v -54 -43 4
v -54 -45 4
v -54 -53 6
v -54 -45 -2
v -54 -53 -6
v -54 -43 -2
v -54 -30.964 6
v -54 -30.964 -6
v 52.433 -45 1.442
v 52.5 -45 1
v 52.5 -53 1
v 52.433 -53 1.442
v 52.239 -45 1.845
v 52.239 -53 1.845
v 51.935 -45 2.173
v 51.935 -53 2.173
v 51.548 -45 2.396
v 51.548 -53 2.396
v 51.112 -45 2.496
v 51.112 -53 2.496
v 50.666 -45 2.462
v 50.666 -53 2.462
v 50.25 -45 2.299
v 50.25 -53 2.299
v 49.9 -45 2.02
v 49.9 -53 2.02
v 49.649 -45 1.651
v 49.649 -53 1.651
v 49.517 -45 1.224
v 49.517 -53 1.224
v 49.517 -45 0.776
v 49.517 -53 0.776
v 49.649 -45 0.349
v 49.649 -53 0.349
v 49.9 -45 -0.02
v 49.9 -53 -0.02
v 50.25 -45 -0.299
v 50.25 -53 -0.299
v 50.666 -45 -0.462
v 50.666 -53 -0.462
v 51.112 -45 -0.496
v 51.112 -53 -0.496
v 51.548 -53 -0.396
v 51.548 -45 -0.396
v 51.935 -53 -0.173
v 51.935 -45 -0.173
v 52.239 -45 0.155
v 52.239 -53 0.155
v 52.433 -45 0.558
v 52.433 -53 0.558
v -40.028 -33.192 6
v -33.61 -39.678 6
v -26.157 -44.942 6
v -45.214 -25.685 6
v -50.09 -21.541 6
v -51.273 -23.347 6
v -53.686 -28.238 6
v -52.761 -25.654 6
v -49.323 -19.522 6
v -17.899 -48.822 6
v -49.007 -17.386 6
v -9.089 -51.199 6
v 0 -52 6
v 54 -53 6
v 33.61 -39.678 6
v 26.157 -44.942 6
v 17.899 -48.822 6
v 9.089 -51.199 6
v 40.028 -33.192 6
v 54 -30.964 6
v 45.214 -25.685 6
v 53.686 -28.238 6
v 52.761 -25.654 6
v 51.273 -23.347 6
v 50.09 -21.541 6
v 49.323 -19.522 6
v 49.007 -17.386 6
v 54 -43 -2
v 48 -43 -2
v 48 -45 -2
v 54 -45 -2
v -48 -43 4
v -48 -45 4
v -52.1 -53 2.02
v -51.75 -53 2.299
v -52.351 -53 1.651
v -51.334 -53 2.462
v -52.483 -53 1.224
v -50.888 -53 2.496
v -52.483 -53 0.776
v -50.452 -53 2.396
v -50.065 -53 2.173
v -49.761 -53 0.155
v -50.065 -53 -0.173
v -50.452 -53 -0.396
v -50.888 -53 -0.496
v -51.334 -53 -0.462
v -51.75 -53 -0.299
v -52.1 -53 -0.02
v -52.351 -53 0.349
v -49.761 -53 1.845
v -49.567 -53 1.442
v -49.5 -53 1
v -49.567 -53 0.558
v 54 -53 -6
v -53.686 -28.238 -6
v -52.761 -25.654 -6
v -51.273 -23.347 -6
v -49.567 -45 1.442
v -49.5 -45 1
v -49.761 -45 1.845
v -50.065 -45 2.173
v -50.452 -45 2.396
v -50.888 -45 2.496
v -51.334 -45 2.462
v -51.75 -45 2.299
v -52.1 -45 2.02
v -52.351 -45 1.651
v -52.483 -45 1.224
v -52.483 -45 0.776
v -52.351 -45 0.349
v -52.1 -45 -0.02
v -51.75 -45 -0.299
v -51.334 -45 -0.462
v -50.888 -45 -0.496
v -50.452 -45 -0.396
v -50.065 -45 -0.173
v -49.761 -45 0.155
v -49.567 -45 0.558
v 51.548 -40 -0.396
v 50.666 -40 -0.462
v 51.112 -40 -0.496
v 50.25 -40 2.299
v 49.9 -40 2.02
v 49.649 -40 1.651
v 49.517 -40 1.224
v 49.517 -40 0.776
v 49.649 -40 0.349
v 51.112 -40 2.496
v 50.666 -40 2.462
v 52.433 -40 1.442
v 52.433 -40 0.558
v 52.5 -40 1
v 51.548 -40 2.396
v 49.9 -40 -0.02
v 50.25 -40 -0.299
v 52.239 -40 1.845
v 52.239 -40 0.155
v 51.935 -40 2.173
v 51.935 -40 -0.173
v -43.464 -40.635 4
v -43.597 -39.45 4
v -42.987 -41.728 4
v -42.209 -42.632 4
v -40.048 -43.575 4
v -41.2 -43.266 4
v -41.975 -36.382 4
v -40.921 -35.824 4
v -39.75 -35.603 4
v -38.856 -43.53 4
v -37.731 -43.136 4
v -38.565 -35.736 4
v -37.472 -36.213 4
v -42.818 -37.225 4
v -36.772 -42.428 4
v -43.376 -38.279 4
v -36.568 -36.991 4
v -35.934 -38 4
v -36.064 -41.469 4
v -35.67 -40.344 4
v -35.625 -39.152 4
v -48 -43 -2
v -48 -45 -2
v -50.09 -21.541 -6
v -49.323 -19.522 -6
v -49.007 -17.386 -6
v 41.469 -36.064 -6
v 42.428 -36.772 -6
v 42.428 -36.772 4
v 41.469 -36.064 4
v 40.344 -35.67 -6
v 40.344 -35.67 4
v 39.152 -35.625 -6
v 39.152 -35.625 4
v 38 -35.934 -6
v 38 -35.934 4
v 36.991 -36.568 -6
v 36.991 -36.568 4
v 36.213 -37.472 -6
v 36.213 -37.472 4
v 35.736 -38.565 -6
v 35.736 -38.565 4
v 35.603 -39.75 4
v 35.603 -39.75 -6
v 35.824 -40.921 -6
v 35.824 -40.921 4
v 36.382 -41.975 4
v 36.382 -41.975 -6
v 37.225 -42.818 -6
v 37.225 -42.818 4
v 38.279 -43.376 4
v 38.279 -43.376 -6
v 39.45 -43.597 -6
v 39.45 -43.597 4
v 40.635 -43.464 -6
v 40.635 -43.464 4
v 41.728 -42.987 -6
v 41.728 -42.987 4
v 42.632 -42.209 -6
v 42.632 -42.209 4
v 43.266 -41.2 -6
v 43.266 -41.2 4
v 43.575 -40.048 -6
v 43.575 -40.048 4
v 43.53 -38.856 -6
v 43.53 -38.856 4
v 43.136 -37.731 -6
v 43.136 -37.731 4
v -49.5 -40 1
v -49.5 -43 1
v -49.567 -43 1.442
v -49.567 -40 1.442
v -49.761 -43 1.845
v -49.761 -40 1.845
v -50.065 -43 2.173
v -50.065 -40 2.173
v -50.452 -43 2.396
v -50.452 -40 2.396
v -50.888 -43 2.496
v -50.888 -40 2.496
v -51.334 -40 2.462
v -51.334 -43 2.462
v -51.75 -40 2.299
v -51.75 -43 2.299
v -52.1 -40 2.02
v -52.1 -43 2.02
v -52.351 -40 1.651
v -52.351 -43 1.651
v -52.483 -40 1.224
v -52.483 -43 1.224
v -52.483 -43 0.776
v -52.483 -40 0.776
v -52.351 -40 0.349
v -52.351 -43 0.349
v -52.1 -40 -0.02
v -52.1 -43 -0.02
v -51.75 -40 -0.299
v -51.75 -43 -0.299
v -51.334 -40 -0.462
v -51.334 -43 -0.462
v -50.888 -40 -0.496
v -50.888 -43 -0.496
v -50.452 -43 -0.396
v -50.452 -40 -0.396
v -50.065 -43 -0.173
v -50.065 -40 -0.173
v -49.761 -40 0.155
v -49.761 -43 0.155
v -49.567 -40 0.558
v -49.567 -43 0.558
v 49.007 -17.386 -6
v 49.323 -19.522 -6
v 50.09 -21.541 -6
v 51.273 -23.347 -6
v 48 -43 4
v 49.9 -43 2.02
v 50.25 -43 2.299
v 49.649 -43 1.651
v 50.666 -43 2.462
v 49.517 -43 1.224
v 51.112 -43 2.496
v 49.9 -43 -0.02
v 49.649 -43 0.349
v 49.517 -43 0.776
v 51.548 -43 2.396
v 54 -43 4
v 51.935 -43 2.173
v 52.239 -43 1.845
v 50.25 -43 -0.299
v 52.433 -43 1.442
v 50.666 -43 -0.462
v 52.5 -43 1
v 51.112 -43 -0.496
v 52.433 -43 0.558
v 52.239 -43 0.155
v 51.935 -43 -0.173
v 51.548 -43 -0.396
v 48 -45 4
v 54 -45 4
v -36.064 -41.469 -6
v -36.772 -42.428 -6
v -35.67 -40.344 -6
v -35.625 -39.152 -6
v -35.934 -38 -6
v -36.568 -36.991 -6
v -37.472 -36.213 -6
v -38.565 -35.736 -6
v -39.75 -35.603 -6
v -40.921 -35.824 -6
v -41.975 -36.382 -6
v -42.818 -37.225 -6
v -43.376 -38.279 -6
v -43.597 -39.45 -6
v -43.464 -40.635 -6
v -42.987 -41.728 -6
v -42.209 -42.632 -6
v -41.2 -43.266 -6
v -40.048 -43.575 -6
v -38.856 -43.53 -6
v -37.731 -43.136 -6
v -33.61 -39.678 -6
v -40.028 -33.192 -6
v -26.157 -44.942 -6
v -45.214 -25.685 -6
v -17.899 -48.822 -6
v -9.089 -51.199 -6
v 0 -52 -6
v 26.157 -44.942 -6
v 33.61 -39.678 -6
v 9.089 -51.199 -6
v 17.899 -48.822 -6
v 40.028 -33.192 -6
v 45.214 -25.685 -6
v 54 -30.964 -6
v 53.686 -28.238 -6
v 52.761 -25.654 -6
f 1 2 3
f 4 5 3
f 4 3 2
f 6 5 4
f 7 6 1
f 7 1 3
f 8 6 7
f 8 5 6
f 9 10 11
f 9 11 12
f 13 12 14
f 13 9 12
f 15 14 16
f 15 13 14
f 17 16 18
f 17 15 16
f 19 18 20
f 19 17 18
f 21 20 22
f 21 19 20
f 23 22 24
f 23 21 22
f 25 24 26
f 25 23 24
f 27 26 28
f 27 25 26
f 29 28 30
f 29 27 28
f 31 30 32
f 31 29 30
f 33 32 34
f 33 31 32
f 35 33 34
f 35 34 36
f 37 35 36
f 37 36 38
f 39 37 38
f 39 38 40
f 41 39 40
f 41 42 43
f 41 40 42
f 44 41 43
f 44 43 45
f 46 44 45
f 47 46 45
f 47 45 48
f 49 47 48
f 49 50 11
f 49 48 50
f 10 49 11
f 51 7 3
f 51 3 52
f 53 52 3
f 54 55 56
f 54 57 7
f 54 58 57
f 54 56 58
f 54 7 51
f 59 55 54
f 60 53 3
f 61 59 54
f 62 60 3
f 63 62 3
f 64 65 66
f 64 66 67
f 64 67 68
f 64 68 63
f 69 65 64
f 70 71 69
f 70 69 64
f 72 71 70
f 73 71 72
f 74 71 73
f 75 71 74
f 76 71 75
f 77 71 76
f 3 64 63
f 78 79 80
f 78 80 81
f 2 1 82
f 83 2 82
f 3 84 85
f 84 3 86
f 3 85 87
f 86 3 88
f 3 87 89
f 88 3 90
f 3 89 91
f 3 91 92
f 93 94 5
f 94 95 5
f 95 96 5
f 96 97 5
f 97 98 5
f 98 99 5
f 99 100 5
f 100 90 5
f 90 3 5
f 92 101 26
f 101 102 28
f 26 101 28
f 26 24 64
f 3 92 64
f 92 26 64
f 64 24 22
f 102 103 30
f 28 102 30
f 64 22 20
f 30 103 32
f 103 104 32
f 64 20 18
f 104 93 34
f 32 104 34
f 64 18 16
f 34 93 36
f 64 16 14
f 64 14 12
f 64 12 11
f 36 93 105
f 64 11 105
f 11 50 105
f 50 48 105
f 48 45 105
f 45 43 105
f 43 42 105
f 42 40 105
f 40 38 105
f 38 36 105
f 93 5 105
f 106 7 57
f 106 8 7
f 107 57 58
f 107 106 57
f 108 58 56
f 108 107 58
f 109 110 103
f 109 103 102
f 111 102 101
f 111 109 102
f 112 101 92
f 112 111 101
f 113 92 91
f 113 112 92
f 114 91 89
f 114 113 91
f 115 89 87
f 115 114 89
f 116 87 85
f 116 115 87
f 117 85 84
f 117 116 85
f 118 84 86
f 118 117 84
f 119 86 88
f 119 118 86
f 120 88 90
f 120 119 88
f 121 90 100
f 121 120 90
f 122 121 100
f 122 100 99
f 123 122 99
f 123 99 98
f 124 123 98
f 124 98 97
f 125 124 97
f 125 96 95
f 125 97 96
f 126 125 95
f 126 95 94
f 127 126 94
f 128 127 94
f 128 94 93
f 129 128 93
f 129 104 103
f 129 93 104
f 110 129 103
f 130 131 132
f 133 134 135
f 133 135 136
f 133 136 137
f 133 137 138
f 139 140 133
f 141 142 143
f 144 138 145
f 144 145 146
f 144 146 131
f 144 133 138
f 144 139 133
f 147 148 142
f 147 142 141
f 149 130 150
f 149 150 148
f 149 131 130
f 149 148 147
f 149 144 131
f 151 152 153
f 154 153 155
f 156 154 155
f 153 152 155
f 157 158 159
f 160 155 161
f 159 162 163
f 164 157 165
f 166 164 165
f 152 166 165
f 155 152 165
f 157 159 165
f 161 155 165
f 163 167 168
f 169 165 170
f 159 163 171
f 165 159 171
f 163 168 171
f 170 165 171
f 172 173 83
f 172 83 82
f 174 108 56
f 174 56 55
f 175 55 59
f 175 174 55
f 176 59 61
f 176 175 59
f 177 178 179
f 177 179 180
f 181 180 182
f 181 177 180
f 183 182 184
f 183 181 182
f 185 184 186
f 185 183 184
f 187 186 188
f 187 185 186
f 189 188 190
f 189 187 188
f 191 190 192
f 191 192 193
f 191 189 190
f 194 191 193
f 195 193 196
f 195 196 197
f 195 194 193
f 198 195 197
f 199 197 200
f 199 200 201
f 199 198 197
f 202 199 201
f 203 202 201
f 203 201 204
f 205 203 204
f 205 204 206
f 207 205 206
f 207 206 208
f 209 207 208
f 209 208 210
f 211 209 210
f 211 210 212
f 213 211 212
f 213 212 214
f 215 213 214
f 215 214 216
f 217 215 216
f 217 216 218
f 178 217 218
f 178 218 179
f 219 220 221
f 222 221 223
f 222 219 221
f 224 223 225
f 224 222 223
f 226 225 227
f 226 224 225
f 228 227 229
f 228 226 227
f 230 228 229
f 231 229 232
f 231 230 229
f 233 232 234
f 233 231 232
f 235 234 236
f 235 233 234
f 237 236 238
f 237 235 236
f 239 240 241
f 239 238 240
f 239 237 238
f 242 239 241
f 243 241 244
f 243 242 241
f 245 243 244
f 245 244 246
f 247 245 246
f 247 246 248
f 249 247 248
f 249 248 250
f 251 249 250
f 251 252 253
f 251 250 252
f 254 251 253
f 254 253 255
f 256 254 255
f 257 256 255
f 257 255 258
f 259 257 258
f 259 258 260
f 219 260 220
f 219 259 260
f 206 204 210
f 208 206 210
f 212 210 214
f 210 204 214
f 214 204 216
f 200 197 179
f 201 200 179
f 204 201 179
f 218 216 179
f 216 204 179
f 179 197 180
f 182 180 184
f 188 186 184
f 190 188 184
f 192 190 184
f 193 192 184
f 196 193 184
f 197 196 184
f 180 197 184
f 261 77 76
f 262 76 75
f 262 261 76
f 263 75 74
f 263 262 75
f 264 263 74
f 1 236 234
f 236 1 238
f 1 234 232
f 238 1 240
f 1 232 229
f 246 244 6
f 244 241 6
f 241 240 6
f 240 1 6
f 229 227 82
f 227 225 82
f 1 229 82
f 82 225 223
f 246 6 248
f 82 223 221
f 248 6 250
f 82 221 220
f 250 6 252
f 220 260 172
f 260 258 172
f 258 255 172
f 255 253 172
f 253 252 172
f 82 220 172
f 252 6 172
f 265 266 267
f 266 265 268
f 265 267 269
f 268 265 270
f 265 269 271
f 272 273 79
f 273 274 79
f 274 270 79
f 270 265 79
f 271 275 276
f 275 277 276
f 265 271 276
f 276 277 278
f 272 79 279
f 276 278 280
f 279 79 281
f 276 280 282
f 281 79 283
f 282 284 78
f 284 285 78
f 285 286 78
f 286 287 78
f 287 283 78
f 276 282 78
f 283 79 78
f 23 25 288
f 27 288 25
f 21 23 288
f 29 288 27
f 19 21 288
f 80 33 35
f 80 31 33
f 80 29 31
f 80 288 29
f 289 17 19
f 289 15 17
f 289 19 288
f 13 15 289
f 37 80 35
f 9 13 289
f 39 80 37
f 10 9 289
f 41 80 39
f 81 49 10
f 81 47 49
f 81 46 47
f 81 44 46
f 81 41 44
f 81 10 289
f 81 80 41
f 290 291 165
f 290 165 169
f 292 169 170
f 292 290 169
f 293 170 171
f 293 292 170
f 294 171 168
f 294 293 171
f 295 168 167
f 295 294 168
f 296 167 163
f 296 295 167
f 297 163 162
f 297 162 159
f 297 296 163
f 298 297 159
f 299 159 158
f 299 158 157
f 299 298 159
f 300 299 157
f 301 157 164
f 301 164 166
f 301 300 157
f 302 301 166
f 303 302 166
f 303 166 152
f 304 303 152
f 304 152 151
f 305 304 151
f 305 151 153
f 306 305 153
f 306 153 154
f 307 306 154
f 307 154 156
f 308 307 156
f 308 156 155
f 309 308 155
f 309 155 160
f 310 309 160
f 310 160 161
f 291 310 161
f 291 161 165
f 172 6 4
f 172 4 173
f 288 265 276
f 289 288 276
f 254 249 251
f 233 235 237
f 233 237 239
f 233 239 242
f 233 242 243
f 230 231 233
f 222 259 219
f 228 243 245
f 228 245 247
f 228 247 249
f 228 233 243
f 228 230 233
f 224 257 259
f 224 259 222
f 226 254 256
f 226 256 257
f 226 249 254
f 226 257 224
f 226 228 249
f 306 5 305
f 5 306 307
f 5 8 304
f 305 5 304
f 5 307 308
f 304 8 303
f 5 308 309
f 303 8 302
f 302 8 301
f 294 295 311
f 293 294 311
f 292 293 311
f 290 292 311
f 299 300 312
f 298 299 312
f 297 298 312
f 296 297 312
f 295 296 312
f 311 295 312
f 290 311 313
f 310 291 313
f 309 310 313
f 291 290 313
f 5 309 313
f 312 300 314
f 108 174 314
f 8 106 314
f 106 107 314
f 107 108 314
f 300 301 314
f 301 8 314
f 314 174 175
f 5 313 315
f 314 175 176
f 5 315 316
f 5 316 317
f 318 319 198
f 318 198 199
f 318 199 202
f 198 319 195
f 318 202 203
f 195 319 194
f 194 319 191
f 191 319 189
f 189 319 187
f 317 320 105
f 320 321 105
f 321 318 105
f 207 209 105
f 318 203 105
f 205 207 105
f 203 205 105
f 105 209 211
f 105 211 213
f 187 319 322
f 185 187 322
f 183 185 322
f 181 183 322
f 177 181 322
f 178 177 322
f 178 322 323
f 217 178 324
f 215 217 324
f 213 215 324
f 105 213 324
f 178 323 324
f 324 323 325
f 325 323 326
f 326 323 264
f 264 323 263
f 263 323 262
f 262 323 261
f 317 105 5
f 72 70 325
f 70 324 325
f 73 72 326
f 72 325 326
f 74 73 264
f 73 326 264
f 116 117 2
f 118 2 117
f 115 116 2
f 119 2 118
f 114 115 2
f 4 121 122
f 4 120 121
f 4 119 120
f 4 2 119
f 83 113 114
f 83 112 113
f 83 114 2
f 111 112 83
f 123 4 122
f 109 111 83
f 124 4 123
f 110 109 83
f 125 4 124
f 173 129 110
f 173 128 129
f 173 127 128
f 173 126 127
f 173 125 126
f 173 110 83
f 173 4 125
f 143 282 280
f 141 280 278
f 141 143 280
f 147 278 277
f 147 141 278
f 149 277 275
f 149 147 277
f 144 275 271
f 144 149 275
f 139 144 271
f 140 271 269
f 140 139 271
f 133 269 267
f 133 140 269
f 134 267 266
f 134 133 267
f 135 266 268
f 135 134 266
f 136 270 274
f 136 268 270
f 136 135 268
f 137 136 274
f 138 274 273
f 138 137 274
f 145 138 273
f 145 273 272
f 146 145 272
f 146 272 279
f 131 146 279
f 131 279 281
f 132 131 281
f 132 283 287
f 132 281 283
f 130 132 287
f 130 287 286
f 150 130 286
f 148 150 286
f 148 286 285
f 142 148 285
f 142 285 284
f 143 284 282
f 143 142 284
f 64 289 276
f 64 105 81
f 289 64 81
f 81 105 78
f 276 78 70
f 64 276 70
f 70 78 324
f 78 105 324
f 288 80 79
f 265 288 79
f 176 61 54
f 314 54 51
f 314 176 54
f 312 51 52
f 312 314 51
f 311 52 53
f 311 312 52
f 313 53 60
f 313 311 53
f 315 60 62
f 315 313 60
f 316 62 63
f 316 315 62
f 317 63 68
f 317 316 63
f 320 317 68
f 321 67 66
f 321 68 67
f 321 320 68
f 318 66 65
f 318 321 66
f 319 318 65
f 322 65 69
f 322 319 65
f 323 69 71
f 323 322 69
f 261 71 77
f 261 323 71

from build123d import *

# Parameters (mm, degrees)
CYLINDER1391_R               = 1.5
CYLINDER1391_DEPTH           = 20
CYLINDER1390_R               = 1.5
CYLINDER1390_DEPTH           = 20
CYLINDER1385_R               = 1.5
CYLINDER1385_DEPTH           = 20
CYLINDER1389_R               = 1.5
CYLINDER1389_DEPTH           = 20
BOX514_W                     = 6
BOX514_H                     = 2
BOX514_DEPTH                 = 6
BOX511_W                     = 6
BOX511_H                     = 2
BOX511_DEPTH                 = 6
BOX513_W                     = 6
BOX513_H                     = 2
BOX513_DEPTH                 = 6
BOX512_W                     = 6
BOX512_H                     = 2
BOX512_DEPTH                 = 6
CYLINDER1392_R               = 4
CYLINDER1392_DEPTH           = 20
CYLINDER1392_PLACEMENT_ANGLE = 45
CYLINDER1387_R               = 4
CYLINDER1387_DEPTH           = 20
CYLINDER1387_PLACEMENT_ANGLE = 45
CYLINDER1384_R               = 10
CYLINDER1384_DEPTH           = 40
CYLINDER1388_R               = 10
CYLINDER1388_DEPTH           = 40
CYLINDER1386_R               = 52
CYLINDER1386_DEPTH           = 20
BOX510_W                     = 108
BOX510_H                     = 36
BOX510_DEPTH                 = 12
FILLET022_R                  = 12


with BuildPart() as v_lec1391:
    # Cylinder1391 → Cylinder1391 (new body)
    with BuildSketch(Plane(origin=(20, -40, -5), x_dir=(1, 0, 0), z_dir=(0, -1, 0))):
        Circle(CYLINDER1391_R)
    extrude(amount=CYLINDER1391_DEPTH)


with BuildPart() as v_lec1390:
    # Cylinder1390 → Cylinder1390 (new body)
    with BuildSketch(Plane(origin=(51, -40, 7), x_dir=(1, 0, 0), z_dir=(0, -1, 0))):
        Circle(CYLINDER1390_R)
    extrude(amount=CYLINDER1390_DEPTH)


with BuildPart() as v_lec1385:
    # Cylinder1385 → Cylinder1385 (new body)
    with BuildSketch(Plane(origin=(-51, -40, 7), x_dir=(1, 0, 0), z_dir=(0, -1, 0))):
        Circle(CYLINDER1385_R)
    extrude(amount=CYLINDER1385_DEPTH)


with BuildPart() as compound879:
    # Cylinder1389 → Cylinder1389 (new body)
    with BuildSketch(Plane(origin=(-20, -40, -5), x_dir=(1, 0, 0), z_dir=(0, -1, 0))):
        Circle(CYLINDER1389_R)
    extrude(amount=CYLINDER1389_DEPTH)

    # Compound879: union Válec1391, Válec1390, Válec1385
    add(v_lec1391.part)
    add(v_lec1390.part)
    add(v_lec1385.part)


with BuildPart() as krychle514:
    # Box514 → Box514 (new body)
    with BuildSketch(Plane(origin=(17, -47, -8), x_dir=(1, 0, 0), z_dir=(0, 0, 1))):
        with Locations((3, 1)):
            Rectangle(BOX514_W, BOX514_H)
    extrude(amount=BOX514_DEPTH)


with BuildPart() as krychle511:
    # Box511 → Box511 (new body)
    with BuildSketch(Plane(origin=(48, -45, 4), x_dir=(1, 0, 0), z_dir=(0, 0, 1))):
        with Locations((3, 1)):
            Rectangle(BOX511_W, BOX511_H)
    extrude(amount=BOX511_DEPTH)


with BuildPart() as krychle513:
    # Box513 → Box513 (new body)
    with BuildSketch(Plane(origin=(-54, -45, 4), x_dir=(1, 0, 0), z_dir=(0, 0, 1))):
        with Locations((3, 1)):
            Rectangle(BOX513_W, BOX513_H)
    extrude(amount=BOX513_DEPTH)


with BuildPart() as compound877:
    # Box512 → Box512 (new body)
    with BuildSketch(Plane(origin=(-23, -47, -8), x_dir=(1, 0, 0), z_dir=(0, 0, 1))):
        with Locations((3, 1)):
            Rectangle(BOX512_W, BOX512_H)
    extrude(amount=BOX512_DEPTH)

    # Compound877: union Krychle514, Krychle511, Krychle513
    add(krychle514.part)
    add(krychle511.part)
    add(krychle513.part)


with BuildPart() as v_lec1392:
    # Cylinder1392 → Cylinder1392 (new body)
    with BuildSketch(Plane.XY):
        Circle(CYLINDER1392_R)
    extrude(amount=CYLINDER1392_DEPTH)


with BuildPart() as v_lec1392_1:
    # Cylinder1392 placement: moved
    add(v_lec1392.part.moved(Location((39.6, -39.6, -10))).rotate(Axis((39.6, -39.6, -10), (0, 0, 1)), CYLINDER1392_PLACEMENT_ANGLE))


with BuildPart() as compound876:
    # Cylinder1387 → Cylinder1387 (new body)
    with BuildSketch(Plane.XY):
        Circle(CYLINDER1387_R)
    extrude(amount=CYLINDER1387_DEPTH)


with BuildPart() as compound876_1:
    # Cylinder1387 placement: moved
    add(compound876.part.moved(Location((-39.6, -39.6, -10))).rotate(Axis((-39.6, -39.6, -10), (0, 0, -1)), CYLINDER1387_PLACEMENT_ANGLE))

    # Compound876: union Válec1392
    add(v_lec1392_1.part)


with BuildPart() as v_lec1384:
    # Cylinder1384 → Cylinder1384 (new body)
    with BuildSketch(Plane(origin=(-59, -17, 0), x_dir=(1, 0, 0), z_dir=(0, 0, 1))):
        Circle(CYLINDER1384_R)
    extrude(amount=CYLINDER1384_DEPTH)


with BuildPart() as compound878:
    # Cylinder1388 → Cylinder1388 (new body)
    with BuildSketch(Plane(origin=(59, -17, 0), x_dir=(1, 0, 0), z_dir=(0, 0, 1))):
        Circle(CYLINDER1388_R)
    extrude(amount=CYLINDER1388_DEPTH)

    # Compound878: union Válec1384
    add(v_lec1384.part)


with BuildPart() as v_lec1386:
    # Cylinder1386 → Cylinder1386 (new body)
    with BuildSketch(Plane.XY.offset(20)):
        Circle(CYLINDER1386_R)
    extrude(amount=CYLINDER1386_DEPTH)


with BuildPart() as fillet022:
    # Box510 → Box510 (new body)
    with BuildSketch(Plane(origin=(-54, -53, 20), x_dir=(1, 0, 0), z_dir=(0, 0, 1))):
        with Locations((54, 18)):
            Rectangle(BOX510_W, BOX510_H)
    extrude(amount=BOX510_DEPTH)

    # Cut498: cut Válec1386
    add(v_lec1386.part, mode=Mode.SUBTRACT)


with BuildPart() as fillet022_1:
    # Cut498 placement: moved
    add(fillet022.part.moved(Location((0, 0, -20))))

    # Cut499: cut Compound878
    add(compound878.part, mode=Mode.SUBTRACT)

    # Cut496: cut Compound876
    add(compound876_1.part, mode=Mode.SUBTRACT)

    # Cut497: cut Compound877
    add(compound877.part, mode=Mode.SUBTRACT)

    # Cut495: cut Compound879
    add(compound879.part, mode=Mode.SUBTRACT)

    # Fillet022
    fillet022_edges = [fillet022_1.edges().sort_by_distance(p)[0] for p in [
        (-54, -25.660254, 6),
        (54, -25.660254, 6),
    ]]
    fillet(fillet022_edges, radius=FILLET022_R)


with BuildPart() as fillet022_2:
    # Fillet022 placement: moved
    add(fillet022_1.part.moved(Location((0, 0, -6))))


solid = fillet022_2.part
